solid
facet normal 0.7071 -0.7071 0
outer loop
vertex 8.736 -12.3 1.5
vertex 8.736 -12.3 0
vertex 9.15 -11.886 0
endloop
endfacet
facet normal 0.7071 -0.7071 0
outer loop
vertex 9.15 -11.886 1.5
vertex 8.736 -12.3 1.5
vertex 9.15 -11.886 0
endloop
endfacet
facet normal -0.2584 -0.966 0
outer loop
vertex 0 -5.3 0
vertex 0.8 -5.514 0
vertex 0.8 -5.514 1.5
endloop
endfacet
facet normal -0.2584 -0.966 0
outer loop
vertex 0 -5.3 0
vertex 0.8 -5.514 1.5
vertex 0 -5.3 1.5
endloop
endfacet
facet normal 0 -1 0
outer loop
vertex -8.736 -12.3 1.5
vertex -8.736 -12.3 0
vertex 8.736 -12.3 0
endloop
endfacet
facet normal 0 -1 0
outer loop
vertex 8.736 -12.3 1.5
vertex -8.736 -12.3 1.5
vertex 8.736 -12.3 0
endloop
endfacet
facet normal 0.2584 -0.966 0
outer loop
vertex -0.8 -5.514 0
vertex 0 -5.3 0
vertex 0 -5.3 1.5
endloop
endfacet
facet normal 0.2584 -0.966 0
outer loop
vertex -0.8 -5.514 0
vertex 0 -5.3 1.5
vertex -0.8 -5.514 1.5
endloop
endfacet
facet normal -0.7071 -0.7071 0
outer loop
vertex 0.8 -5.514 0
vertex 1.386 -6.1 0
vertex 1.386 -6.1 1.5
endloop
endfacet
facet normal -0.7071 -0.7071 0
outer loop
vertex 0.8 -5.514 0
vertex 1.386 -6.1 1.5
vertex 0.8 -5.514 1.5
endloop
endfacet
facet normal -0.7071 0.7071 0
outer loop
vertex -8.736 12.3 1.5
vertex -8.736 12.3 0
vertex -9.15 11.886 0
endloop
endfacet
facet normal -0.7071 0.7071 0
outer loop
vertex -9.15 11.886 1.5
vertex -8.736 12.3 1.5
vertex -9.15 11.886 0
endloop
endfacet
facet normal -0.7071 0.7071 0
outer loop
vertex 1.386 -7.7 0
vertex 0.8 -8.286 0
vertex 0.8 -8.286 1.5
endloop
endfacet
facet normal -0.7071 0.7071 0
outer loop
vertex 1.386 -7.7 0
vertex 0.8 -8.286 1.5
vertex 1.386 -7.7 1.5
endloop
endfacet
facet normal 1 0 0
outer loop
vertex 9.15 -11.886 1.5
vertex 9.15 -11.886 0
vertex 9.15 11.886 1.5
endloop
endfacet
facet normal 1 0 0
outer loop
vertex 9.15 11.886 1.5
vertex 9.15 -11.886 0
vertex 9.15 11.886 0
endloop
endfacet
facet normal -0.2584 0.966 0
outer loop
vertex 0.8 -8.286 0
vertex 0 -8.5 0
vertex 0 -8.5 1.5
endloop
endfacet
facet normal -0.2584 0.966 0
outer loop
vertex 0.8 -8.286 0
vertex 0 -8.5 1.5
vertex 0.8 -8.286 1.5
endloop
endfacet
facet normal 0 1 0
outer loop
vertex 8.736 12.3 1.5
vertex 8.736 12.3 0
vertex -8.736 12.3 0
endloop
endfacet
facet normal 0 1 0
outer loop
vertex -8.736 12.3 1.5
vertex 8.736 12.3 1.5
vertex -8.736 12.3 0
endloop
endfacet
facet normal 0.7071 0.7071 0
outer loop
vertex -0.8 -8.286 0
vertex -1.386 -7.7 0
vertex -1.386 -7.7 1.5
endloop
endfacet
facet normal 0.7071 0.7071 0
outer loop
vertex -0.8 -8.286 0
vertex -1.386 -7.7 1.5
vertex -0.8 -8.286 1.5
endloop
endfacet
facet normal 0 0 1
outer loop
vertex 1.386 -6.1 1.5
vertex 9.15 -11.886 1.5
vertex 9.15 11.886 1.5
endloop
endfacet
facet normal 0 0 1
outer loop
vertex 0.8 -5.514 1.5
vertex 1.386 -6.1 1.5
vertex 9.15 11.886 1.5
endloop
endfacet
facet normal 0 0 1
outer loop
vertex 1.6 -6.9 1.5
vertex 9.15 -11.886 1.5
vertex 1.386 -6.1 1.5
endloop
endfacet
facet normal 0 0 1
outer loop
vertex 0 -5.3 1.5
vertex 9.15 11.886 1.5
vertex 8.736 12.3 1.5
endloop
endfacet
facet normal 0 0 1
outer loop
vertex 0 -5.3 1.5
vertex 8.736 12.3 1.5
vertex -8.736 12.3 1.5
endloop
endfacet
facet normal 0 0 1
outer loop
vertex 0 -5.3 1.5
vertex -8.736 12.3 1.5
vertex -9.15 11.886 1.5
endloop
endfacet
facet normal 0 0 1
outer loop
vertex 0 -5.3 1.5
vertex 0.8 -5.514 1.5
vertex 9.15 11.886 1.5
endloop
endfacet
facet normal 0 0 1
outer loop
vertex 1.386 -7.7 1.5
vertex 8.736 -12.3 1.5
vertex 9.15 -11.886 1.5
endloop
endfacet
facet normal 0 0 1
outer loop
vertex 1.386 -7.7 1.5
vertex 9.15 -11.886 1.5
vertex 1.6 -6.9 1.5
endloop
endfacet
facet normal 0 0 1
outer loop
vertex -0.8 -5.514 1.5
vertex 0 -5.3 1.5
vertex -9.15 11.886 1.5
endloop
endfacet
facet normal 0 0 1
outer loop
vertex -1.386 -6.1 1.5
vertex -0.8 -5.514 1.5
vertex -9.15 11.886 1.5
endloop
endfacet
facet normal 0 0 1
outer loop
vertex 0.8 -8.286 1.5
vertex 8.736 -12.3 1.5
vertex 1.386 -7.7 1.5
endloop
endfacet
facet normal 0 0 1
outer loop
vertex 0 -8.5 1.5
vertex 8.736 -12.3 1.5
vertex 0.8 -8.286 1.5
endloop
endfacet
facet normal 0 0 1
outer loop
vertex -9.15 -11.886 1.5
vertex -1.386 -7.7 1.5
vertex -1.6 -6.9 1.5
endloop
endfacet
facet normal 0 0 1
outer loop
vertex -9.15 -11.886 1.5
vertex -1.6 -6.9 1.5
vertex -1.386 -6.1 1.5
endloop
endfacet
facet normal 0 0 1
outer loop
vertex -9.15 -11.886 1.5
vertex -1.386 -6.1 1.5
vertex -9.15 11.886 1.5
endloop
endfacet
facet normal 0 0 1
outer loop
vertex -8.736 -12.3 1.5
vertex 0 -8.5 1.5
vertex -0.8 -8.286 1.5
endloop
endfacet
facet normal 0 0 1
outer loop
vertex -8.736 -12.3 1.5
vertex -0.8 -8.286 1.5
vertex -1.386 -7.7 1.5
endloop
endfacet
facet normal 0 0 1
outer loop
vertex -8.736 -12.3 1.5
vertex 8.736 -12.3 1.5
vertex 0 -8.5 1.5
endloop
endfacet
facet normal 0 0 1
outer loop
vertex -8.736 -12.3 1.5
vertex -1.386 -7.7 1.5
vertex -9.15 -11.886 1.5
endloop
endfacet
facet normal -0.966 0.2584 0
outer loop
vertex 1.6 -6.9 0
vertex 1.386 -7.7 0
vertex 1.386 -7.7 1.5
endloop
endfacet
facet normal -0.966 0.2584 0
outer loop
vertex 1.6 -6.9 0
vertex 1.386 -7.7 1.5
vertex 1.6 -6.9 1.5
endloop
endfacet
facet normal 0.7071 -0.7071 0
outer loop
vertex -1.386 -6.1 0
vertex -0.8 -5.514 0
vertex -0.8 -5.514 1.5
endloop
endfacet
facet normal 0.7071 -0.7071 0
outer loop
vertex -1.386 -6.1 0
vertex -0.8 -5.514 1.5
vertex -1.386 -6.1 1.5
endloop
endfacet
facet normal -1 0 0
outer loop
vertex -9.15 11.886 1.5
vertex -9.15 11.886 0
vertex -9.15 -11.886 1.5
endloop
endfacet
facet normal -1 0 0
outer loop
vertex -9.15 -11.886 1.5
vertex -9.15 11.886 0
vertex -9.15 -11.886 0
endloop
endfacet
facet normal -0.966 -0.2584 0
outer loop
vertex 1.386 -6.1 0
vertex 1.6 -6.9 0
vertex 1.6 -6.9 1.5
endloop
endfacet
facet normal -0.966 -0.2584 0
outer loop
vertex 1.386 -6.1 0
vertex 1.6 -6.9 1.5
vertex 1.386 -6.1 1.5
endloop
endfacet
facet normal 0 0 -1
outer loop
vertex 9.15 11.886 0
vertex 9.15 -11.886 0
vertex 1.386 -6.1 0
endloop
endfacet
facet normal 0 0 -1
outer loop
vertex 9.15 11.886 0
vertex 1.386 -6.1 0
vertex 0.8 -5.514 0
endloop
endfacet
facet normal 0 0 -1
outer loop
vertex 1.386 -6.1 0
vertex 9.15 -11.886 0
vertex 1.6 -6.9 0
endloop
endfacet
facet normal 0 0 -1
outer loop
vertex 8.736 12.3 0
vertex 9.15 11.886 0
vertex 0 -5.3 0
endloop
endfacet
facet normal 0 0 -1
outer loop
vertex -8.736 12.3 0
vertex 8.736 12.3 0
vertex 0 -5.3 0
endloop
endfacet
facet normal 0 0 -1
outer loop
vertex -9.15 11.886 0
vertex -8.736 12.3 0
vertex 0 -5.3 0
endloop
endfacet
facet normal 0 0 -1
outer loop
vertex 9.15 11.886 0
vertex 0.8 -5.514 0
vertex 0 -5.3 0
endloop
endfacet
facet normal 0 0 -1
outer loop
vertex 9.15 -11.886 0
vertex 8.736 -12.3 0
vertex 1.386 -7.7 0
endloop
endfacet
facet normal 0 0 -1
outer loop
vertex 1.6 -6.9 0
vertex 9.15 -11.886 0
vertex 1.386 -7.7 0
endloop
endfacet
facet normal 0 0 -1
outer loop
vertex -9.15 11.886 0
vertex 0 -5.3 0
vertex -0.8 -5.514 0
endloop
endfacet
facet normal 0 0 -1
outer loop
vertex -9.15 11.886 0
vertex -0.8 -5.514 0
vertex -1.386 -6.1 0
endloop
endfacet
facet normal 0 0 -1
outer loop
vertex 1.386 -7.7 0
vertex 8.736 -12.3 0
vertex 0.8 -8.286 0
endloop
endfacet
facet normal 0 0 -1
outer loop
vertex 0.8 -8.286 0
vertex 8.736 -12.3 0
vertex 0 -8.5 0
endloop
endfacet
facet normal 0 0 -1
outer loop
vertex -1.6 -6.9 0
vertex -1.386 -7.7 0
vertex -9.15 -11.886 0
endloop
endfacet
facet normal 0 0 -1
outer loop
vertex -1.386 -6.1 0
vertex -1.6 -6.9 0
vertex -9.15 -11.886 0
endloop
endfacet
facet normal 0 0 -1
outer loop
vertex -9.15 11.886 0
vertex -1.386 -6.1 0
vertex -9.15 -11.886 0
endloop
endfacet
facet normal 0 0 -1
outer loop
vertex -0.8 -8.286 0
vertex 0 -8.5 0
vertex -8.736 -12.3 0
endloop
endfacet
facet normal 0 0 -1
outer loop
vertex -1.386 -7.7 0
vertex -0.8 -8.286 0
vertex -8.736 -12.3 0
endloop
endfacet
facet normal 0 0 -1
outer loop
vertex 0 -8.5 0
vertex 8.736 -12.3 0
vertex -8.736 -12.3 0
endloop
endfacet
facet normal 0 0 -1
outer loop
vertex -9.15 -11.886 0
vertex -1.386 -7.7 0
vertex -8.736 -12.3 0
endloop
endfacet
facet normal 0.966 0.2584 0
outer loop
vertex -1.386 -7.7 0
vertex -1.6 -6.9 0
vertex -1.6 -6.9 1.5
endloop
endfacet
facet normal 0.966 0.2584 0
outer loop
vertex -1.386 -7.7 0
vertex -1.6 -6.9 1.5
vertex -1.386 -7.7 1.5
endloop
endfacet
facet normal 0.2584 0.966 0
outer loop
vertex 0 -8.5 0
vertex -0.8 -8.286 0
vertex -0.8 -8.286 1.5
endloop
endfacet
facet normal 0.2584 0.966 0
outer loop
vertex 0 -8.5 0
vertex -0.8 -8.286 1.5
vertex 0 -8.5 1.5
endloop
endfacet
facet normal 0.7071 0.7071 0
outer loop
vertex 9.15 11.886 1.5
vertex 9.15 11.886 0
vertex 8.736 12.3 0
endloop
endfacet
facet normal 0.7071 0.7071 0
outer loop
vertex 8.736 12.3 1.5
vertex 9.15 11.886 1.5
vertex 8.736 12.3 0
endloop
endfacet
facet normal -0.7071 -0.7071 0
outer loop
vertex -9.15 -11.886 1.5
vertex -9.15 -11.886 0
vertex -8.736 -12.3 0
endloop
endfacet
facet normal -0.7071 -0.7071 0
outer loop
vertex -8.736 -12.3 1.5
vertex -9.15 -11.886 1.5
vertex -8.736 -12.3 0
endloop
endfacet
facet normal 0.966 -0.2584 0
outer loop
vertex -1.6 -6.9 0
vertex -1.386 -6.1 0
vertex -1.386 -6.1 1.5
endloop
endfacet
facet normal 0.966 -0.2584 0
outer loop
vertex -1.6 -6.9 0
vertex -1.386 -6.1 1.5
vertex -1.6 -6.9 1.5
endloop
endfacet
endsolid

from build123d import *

# Parameters (mm, degrees)
EXTRUDE_3_DEPTH = 1.5


with BuildPart() as part:
    # Эскиз2 → Бобышка-Вытянуть3 (new body)
    with BuildSketch(Plane(origin=(0, 0, 0), x_dir=(-1, 0, 0), z_dir=(0, 0, 1))):
        Polygon((9.15, -11.885786438), (9.15, 11.885786438), (8.735786438, 12.3), (-8.735786438, 12.3), (-9.15, 11.885786438), (-9.15, -11.885786438), (-8.735786438, -12.3), (8.735786438, -12.3), align=None)
        Polygon((0, 8.5), (-0.8, 8.285640646), (-1.385640646, 7.7), (-1.6, 6.9), (-1.385640646, 6.1), (-0.8, 5.514359354), (0, 5.3), (0.8, 5.514359354), (1.385640646, 6.1), (1.6, 6.9), (1.385640646, 7.7), (0.8, 8.285640646), align=None, mode=Mode.SUBTRACT)
    extrude(amount=EXTRUDE_3_DEPTH)


solid = part.part
